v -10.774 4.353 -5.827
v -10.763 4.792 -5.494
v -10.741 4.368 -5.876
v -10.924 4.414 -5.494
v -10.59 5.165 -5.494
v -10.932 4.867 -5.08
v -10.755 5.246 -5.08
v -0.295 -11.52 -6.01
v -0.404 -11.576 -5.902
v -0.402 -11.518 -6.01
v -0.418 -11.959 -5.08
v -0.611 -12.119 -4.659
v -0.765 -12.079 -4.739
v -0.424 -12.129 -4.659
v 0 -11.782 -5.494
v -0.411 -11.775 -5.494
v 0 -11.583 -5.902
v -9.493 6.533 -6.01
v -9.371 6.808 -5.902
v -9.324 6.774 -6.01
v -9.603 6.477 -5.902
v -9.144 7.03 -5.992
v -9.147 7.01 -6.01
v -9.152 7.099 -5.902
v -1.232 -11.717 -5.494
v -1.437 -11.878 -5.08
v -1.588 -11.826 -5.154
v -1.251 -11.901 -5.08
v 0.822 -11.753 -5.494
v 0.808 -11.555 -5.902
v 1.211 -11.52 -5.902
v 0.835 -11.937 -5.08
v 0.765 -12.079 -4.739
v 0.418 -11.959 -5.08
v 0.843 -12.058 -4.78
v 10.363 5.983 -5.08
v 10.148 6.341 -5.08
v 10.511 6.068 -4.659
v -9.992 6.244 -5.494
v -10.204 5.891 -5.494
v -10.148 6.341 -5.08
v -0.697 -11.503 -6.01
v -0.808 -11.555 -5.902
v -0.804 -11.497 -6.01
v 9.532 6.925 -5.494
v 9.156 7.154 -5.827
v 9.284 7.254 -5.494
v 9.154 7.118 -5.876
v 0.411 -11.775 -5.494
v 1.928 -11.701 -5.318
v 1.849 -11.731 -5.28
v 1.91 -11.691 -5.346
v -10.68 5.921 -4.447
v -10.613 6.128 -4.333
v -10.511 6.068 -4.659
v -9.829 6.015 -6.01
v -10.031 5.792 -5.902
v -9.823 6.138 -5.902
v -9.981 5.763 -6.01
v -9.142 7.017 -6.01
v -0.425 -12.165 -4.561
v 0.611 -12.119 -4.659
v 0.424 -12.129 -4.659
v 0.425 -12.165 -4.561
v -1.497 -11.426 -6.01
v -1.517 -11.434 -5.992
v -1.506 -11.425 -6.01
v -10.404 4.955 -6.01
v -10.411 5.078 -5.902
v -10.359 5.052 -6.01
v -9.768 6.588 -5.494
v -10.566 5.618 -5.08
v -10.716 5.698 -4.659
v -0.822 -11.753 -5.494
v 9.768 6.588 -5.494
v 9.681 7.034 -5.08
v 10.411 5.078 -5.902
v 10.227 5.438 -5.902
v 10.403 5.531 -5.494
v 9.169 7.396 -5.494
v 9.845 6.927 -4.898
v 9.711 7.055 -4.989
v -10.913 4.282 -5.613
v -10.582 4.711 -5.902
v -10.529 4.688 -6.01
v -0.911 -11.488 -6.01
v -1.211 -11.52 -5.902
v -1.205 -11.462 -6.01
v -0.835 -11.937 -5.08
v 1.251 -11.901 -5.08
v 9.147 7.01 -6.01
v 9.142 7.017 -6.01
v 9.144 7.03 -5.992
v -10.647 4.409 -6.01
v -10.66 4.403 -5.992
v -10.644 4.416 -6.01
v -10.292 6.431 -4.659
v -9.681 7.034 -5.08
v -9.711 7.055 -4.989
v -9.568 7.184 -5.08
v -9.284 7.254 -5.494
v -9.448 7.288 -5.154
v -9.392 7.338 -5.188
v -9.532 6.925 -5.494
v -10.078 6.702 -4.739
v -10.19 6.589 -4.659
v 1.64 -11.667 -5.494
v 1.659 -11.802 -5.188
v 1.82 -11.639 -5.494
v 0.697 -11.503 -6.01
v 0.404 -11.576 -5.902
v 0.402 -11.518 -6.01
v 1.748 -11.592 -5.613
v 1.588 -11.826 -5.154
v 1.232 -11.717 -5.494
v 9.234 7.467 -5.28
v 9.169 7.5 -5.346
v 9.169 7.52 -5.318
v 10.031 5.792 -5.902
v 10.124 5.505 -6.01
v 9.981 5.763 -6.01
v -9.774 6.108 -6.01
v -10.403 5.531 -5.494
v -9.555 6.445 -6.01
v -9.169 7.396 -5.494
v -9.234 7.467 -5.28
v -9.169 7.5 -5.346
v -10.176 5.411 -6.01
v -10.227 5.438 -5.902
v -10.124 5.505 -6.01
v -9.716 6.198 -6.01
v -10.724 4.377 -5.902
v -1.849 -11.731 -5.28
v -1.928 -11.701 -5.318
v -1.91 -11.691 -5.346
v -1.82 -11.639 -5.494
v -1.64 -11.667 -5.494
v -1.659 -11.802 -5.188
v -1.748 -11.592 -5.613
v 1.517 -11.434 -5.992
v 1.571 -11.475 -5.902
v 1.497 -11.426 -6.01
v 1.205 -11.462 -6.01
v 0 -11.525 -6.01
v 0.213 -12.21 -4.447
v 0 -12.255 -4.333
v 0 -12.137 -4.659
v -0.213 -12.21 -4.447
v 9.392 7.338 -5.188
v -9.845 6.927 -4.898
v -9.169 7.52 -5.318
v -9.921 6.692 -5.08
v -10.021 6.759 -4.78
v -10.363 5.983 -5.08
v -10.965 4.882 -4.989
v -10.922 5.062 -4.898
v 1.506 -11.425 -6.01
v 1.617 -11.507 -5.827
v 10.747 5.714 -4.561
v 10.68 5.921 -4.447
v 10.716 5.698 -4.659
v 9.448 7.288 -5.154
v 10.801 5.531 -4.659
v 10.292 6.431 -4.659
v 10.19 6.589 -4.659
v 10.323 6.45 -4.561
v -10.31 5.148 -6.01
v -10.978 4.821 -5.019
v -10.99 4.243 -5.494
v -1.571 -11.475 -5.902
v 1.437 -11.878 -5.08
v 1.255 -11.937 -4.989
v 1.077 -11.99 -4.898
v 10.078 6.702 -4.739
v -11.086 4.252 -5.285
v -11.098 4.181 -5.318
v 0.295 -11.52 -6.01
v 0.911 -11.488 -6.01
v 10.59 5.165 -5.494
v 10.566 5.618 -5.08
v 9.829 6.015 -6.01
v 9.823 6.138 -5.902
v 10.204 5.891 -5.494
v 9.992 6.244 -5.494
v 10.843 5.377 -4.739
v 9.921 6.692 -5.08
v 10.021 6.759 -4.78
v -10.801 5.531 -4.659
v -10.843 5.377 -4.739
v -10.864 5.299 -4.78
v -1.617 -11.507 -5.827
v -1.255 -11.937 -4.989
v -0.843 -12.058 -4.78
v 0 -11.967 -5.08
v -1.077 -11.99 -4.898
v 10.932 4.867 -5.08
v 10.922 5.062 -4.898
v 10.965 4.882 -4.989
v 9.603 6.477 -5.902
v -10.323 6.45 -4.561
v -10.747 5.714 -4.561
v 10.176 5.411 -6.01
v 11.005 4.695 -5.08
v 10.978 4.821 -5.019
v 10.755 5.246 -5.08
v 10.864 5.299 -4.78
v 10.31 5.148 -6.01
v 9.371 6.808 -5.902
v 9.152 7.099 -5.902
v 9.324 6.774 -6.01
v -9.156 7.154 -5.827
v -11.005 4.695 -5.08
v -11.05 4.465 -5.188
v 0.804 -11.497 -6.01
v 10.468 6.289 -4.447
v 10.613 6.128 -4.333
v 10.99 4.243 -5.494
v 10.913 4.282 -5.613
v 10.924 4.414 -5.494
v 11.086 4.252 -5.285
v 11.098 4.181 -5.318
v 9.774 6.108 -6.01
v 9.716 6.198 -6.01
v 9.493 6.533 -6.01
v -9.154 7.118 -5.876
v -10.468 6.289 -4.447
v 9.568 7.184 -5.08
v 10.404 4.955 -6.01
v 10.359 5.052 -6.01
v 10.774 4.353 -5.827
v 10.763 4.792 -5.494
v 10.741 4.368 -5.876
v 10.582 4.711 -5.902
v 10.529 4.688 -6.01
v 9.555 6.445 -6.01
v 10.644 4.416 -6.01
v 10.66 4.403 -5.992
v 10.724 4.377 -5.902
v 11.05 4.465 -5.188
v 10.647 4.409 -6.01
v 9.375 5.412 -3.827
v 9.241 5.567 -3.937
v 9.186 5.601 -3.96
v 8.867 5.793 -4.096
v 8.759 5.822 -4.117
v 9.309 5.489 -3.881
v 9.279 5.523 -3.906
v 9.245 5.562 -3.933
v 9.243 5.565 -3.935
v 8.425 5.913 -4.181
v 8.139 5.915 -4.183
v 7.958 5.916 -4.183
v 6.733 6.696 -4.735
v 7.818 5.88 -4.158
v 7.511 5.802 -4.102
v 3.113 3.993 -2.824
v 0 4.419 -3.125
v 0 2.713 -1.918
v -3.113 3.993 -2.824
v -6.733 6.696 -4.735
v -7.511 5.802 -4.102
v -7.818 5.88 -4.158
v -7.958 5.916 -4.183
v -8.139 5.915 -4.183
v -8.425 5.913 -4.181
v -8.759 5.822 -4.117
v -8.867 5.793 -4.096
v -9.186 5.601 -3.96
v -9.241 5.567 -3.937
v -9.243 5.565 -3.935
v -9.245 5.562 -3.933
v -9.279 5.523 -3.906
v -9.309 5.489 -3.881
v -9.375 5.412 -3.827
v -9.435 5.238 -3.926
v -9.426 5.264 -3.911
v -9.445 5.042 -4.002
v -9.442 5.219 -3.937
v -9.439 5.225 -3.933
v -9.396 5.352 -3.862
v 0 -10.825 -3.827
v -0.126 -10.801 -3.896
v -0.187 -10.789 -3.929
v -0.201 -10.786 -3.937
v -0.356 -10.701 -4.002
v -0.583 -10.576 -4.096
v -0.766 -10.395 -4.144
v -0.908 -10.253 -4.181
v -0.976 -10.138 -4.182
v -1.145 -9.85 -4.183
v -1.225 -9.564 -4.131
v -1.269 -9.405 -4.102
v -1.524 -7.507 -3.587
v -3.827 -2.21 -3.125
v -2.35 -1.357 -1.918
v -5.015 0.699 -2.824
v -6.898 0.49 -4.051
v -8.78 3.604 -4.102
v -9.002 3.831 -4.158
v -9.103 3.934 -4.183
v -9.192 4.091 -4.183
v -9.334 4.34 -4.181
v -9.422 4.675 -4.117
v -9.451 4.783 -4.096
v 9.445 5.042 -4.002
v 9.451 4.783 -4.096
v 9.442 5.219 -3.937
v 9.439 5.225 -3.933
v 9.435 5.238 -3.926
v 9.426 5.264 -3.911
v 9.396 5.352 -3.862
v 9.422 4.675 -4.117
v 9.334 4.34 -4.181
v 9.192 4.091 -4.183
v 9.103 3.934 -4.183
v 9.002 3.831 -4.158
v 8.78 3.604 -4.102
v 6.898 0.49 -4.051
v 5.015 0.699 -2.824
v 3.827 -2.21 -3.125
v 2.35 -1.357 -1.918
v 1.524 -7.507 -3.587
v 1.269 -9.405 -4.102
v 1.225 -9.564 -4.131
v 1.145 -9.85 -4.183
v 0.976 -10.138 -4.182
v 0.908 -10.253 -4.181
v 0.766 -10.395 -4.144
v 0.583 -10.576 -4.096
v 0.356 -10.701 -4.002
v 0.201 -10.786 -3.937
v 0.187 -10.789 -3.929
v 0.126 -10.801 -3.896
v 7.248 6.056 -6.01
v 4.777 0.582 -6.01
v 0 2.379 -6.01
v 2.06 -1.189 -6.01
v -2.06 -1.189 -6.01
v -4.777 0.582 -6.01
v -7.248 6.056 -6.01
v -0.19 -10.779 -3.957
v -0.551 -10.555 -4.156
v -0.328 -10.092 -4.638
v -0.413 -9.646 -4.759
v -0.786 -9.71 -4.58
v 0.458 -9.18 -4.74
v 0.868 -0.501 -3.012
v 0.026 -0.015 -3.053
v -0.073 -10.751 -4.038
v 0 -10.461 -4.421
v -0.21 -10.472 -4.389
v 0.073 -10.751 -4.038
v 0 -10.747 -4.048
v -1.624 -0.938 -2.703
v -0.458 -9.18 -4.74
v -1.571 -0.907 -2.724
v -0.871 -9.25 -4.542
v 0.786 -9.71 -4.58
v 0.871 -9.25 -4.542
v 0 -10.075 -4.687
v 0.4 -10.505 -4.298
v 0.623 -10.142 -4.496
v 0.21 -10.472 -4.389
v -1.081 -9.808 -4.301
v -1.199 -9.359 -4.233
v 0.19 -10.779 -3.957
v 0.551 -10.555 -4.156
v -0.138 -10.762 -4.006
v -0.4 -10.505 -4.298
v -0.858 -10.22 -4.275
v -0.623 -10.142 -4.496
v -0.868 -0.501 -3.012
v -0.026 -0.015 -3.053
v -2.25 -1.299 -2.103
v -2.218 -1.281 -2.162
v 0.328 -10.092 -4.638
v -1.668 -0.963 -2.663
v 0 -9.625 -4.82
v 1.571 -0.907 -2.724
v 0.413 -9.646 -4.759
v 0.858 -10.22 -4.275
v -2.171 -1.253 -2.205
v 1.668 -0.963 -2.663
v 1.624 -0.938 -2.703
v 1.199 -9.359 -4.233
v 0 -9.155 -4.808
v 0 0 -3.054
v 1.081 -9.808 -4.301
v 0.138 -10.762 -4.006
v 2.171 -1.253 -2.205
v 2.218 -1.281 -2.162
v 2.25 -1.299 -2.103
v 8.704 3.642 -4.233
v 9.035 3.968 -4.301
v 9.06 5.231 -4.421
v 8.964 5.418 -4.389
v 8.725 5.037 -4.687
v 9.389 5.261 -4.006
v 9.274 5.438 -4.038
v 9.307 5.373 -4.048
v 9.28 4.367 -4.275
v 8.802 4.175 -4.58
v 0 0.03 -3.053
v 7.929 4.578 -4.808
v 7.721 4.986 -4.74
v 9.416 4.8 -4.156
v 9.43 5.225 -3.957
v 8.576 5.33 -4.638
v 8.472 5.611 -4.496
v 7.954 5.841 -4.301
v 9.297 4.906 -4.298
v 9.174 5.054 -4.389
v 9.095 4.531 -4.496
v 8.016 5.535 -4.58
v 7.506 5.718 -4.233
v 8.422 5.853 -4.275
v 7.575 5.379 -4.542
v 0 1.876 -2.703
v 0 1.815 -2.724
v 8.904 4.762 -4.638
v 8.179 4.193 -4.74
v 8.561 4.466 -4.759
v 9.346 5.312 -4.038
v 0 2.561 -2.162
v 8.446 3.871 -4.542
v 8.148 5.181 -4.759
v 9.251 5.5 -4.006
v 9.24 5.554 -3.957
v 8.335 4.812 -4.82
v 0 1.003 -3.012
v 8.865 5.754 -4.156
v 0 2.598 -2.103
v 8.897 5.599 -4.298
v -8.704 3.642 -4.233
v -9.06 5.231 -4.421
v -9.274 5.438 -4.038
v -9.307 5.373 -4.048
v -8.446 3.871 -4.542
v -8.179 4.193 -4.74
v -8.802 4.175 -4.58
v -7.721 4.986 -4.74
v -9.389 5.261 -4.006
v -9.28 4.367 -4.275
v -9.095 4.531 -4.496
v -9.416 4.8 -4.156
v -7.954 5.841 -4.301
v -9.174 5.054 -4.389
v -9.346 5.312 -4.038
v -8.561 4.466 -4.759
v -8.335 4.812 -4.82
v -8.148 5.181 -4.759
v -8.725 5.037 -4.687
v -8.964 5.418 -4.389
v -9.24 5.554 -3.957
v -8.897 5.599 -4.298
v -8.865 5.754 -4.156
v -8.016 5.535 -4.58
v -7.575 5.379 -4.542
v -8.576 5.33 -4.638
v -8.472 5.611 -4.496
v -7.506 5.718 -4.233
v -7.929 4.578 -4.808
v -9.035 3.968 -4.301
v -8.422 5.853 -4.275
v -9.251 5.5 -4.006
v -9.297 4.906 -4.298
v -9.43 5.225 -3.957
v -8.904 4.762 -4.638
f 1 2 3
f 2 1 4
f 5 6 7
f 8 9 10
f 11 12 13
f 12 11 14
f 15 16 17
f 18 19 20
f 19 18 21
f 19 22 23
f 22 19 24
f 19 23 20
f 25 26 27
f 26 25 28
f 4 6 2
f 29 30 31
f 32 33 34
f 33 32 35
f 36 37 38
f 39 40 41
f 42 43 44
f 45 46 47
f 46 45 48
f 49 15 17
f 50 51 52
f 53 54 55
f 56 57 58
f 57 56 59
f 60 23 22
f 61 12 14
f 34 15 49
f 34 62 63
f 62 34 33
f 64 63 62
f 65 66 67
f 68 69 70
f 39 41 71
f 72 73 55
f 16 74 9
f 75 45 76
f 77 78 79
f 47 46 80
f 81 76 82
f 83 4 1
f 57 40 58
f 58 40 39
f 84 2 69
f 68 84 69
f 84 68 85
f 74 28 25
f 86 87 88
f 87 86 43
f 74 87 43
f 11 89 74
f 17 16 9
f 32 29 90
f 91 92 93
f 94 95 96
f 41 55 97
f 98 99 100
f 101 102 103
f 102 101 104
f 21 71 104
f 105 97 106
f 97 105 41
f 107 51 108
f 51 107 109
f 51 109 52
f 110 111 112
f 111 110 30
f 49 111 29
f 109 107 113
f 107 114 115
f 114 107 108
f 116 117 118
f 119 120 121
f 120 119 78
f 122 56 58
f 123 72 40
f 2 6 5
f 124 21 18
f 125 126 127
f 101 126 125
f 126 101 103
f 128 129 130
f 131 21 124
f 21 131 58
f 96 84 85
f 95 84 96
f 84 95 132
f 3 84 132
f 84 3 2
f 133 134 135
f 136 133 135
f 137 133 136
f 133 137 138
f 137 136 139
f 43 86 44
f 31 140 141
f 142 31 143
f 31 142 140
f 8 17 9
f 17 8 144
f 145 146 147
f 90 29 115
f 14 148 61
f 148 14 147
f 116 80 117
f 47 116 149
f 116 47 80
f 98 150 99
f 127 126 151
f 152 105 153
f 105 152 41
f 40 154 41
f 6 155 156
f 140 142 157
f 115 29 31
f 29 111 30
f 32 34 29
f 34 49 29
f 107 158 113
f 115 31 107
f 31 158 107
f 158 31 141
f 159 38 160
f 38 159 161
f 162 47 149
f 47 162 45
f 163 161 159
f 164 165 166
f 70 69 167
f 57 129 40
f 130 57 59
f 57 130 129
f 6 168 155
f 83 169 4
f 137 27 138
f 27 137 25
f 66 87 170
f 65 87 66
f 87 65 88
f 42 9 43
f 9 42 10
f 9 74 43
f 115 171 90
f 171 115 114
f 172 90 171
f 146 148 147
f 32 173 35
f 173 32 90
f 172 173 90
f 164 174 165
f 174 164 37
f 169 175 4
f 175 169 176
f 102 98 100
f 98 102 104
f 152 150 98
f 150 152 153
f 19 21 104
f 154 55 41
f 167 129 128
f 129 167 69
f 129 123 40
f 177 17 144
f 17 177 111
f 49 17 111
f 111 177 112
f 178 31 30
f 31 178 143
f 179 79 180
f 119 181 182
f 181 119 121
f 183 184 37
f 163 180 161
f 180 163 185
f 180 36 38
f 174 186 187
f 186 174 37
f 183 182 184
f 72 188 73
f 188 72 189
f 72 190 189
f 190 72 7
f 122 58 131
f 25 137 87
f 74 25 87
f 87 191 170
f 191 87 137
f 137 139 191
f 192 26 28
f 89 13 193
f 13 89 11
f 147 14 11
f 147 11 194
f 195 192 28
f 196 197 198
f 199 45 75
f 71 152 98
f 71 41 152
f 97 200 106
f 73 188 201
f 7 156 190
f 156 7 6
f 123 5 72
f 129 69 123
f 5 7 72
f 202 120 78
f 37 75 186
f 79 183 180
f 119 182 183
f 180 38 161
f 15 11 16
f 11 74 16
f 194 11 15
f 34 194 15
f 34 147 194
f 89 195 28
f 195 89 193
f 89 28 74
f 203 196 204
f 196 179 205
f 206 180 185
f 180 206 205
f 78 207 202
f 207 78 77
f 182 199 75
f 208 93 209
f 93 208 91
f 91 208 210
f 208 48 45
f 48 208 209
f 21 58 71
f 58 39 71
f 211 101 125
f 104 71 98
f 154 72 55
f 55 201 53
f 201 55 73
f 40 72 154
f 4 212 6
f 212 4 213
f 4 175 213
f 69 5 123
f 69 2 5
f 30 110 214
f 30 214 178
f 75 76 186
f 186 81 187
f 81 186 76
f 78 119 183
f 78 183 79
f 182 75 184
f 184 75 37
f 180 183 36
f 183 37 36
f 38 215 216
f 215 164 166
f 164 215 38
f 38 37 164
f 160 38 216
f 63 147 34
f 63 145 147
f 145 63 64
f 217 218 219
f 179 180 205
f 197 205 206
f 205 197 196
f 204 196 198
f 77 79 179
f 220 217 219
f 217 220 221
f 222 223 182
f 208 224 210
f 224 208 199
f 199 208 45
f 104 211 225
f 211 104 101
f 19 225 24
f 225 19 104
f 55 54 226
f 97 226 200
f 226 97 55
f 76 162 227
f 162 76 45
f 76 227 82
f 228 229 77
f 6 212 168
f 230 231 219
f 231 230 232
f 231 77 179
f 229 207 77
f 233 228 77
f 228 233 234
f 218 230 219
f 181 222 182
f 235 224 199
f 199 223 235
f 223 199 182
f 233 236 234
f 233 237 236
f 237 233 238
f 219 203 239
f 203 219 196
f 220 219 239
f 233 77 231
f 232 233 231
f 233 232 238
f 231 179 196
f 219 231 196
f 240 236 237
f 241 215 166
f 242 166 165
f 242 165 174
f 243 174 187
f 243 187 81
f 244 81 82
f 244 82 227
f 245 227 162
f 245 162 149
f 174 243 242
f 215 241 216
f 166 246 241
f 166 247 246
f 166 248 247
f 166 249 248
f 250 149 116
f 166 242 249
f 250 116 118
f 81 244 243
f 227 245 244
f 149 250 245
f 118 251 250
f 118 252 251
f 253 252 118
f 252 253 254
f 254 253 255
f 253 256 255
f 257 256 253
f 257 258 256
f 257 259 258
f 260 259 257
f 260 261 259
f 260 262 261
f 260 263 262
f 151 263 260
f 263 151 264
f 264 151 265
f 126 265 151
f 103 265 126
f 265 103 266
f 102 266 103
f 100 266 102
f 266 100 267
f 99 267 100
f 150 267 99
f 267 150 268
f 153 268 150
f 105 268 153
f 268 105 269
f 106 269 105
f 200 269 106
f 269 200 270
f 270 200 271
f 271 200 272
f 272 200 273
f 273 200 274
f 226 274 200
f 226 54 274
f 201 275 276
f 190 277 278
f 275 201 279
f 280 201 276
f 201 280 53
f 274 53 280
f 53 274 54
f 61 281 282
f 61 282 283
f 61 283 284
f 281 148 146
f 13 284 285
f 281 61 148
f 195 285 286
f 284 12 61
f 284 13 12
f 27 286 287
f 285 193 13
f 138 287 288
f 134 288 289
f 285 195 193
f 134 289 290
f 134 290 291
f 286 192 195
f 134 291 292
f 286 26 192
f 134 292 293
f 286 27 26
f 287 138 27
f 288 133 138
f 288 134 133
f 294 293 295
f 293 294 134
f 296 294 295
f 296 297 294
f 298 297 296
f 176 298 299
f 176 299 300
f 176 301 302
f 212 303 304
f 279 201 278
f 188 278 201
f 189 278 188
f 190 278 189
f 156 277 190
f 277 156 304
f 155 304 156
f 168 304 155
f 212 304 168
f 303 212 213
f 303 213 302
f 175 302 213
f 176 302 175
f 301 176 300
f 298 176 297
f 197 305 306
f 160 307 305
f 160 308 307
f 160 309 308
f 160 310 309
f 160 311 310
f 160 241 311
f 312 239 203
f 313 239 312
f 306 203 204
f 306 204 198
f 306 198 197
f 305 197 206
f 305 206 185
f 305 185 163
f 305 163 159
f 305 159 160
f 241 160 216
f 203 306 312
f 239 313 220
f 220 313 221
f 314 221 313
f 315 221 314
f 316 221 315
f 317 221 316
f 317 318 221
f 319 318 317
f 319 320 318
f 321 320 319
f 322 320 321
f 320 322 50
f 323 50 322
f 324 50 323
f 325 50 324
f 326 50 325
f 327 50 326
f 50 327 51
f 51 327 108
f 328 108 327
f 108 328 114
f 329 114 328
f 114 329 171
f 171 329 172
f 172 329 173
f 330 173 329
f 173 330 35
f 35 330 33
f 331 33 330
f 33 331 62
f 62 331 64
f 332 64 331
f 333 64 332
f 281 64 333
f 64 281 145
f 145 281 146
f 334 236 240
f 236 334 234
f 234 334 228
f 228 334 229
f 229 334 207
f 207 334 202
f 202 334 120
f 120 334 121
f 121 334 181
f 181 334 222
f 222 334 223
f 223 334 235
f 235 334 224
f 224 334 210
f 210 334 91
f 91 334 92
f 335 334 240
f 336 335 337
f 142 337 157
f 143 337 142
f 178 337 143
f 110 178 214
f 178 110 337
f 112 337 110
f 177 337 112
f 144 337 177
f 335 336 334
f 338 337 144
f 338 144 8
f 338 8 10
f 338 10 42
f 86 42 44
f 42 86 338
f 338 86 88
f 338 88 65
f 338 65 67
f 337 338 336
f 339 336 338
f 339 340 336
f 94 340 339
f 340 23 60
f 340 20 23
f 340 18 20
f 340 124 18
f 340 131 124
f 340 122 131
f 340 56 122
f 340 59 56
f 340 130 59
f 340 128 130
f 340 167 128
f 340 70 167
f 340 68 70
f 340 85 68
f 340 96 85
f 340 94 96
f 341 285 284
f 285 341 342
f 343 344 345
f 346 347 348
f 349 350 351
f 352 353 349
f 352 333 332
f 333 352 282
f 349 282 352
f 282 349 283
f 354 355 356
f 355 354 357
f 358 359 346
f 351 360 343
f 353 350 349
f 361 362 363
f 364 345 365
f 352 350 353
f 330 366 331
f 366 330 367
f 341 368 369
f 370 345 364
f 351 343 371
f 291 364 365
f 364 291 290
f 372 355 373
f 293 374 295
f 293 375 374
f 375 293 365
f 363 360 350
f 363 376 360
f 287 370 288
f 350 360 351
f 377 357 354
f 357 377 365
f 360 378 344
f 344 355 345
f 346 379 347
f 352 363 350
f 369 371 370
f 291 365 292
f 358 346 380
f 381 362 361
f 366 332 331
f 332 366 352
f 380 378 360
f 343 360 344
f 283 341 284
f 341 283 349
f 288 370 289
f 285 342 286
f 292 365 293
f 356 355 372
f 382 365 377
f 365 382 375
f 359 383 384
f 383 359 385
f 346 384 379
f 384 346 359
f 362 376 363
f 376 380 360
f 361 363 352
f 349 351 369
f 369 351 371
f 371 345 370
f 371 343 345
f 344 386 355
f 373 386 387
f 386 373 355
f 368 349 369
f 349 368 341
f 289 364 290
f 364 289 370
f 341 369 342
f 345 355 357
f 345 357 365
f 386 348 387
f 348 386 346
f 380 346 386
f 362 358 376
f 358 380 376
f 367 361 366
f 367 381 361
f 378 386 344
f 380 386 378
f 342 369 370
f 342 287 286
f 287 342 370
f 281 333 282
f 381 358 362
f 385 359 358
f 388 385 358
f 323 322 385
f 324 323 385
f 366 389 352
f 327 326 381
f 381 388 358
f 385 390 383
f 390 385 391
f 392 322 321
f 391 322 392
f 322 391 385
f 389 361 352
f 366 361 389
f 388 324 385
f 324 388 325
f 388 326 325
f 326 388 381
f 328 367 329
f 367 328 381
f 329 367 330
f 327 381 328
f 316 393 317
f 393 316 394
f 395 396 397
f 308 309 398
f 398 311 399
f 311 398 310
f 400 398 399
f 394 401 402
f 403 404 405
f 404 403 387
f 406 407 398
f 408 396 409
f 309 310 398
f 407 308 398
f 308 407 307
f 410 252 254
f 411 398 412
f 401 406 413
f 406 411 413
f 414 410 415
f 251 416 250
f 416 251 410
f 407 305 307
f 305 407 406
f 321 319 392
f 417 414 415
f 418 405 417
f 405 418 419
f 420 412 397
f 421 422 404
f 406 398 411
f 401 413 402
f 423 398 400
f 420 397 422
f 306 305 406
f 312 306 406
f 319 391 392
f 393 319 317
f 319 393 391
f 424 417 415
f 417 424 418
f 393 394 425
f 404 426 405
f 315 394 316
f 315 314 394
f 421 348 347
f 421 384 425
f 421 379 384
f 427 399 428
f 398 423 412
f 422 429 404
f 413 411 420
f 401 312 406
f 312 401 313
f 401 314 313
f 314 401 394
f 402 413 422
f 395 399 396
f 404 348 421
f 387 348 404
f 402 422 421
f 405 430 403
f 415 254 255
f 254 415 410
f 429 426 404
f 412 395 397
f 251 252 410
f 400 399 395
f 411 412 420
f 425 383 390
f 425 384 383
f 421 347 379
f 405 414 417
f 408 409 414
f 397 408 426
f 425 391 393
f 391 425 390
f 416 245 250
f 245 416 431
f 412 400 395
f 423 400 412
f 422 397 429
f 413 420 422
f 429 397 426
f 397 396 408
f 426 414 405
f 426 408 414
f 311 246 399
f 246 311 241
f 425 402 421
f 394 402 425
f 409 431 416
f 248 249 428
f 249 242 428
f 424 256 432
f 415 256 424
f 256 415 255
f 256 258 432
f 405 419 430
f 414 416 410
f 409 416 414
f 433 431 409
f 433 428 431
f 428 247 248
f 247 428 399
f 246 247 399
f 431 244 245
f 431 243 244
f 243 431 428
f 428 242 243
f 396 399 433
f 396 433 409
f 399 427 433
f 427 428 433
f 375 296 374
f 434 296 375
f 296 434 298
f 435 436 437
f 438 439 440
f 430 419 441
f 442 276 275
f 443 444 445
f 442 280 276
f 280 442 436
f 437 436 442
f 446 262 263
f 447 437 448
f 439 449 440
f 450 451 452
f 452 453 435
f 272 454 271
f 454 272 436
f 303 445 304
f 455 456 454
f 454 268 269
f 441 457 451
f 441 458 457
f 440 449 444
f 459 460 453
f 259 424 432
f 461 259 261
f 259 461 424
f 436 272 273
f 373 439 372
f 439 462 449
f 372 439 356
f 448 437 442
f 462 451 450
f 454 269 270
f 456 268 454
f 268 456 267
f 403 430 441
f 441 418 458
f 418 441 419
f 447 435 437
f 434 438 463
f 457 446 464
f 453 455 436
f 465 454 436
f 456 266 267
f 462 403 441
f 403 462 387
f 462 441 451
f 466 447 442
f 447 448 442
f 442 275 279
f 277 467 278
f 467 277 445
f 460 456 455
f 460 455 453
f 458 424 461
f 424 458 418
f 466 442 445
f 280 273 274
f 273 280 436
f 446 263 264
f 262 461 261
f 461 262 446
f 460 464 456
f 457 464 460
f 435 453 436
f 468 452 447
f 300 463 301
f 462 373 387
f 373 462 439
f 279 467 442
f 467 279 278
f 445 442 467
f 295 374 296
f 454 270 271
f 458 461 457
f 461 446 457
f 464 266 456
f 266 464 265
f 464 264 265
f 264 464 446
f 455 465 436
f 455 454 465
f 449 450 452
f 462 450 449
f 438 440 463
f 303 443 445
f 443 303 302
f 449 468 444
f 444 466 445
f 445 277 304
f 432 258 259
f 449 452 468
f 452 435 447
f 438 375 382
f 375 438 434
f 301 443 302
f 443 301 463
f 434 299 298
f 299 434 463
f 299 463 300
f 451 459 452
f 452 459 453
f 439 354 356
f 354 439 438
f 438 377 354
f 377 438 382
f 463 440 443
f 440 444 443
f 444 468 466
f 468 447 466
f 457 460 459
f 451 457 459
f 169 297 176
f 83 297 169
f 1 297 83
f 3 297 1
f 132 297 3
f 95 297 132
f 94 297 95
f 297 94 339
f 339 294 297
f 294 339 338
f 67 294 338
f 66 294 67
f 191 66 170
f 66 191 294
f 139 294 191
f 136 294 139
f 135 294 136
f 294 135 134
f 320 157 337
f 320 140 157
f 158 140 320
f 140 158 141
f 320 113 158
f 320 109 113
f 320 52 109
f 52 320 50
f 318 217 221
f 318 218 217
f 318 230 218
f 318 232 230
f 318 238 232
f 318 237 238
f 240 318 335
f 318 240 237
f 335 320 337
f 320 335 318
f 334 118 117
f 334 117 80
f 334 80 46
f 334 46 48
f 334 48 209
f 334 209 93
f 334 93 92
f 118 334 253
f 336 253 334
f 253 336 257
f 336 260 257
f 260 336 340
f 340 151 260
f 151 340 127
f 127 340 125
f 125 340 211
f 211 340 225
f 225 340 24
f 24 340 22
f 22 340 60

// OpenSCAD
tetr_ang2=acos(1/sqrt(3));
tetr_ang=2*tetr_ang2;
module rod(){hull(){translate([0,0,10])sphere(1.5,$fn=20);sphere(3,$fn=20);}}
module tetr1(){
hull(){rotate([0,180-tetr_ang2,0])rod();
translate([0,0,-15])rotate([0,180-tetr_ang2,0])rod();}
hull(){rotate([0,180+tetr_ang2,0])rod();
translate([0,0,-15])rotate([0,180+tetr_ang2,0])rod();}
hull(){rotate([tetr_ang2,0,0])rod();translate([0,0,-15])rotate([tetr_ang2,0,0])rod();}
hull(){rotate([-tetr_ang2,0,0])rod();translate([0,0,-15])rotate([-tetr_ang2,0,0])rod();}
}
module tetr2(){
rod();
rotate([tetr_ang,0,0])rod();
rotate([tetr_ang,0,120])rod();
rotate([tetr_ang,0,-120])rod();
}
r1=17;
h=r1/sqrt(8);
module mold(){
difference(){
intersection(){
sphere(r=13,$fn=180);
translate([0,0,-h])rotate(30)cylinder(r1=r1,r2=0,h=h,$fn=3);}
tetr2();
rotate(30)translate([-15-4-6,0,0])rotate([0,-atan(2*h/r1),0])translate([0,0,-4*h-1])cylinder(r=15,h=4.5*h+2,$fn=8);
rotate(150)translate([-15-4-6,0,0])rotate([0,-atan(2*h/r1),0])translate([0,0,-4*h-1])cylinder(r=15,h=4.5*h+2,$fn=8);
rotate(-90)translate([-15-4-6,0,0])rotate([0,-atan(2*h/r1),0])translate([0,0,-4*h-1])cylinder(r=15,h=4.5*h+2,$fn=8);
}

}
//tetr2();
mold();
%rotate([2*atan(2*h/r1),180,0])mold();
%rotate(120)rotate([2*atan(2*h/r1),180,0])mold();
